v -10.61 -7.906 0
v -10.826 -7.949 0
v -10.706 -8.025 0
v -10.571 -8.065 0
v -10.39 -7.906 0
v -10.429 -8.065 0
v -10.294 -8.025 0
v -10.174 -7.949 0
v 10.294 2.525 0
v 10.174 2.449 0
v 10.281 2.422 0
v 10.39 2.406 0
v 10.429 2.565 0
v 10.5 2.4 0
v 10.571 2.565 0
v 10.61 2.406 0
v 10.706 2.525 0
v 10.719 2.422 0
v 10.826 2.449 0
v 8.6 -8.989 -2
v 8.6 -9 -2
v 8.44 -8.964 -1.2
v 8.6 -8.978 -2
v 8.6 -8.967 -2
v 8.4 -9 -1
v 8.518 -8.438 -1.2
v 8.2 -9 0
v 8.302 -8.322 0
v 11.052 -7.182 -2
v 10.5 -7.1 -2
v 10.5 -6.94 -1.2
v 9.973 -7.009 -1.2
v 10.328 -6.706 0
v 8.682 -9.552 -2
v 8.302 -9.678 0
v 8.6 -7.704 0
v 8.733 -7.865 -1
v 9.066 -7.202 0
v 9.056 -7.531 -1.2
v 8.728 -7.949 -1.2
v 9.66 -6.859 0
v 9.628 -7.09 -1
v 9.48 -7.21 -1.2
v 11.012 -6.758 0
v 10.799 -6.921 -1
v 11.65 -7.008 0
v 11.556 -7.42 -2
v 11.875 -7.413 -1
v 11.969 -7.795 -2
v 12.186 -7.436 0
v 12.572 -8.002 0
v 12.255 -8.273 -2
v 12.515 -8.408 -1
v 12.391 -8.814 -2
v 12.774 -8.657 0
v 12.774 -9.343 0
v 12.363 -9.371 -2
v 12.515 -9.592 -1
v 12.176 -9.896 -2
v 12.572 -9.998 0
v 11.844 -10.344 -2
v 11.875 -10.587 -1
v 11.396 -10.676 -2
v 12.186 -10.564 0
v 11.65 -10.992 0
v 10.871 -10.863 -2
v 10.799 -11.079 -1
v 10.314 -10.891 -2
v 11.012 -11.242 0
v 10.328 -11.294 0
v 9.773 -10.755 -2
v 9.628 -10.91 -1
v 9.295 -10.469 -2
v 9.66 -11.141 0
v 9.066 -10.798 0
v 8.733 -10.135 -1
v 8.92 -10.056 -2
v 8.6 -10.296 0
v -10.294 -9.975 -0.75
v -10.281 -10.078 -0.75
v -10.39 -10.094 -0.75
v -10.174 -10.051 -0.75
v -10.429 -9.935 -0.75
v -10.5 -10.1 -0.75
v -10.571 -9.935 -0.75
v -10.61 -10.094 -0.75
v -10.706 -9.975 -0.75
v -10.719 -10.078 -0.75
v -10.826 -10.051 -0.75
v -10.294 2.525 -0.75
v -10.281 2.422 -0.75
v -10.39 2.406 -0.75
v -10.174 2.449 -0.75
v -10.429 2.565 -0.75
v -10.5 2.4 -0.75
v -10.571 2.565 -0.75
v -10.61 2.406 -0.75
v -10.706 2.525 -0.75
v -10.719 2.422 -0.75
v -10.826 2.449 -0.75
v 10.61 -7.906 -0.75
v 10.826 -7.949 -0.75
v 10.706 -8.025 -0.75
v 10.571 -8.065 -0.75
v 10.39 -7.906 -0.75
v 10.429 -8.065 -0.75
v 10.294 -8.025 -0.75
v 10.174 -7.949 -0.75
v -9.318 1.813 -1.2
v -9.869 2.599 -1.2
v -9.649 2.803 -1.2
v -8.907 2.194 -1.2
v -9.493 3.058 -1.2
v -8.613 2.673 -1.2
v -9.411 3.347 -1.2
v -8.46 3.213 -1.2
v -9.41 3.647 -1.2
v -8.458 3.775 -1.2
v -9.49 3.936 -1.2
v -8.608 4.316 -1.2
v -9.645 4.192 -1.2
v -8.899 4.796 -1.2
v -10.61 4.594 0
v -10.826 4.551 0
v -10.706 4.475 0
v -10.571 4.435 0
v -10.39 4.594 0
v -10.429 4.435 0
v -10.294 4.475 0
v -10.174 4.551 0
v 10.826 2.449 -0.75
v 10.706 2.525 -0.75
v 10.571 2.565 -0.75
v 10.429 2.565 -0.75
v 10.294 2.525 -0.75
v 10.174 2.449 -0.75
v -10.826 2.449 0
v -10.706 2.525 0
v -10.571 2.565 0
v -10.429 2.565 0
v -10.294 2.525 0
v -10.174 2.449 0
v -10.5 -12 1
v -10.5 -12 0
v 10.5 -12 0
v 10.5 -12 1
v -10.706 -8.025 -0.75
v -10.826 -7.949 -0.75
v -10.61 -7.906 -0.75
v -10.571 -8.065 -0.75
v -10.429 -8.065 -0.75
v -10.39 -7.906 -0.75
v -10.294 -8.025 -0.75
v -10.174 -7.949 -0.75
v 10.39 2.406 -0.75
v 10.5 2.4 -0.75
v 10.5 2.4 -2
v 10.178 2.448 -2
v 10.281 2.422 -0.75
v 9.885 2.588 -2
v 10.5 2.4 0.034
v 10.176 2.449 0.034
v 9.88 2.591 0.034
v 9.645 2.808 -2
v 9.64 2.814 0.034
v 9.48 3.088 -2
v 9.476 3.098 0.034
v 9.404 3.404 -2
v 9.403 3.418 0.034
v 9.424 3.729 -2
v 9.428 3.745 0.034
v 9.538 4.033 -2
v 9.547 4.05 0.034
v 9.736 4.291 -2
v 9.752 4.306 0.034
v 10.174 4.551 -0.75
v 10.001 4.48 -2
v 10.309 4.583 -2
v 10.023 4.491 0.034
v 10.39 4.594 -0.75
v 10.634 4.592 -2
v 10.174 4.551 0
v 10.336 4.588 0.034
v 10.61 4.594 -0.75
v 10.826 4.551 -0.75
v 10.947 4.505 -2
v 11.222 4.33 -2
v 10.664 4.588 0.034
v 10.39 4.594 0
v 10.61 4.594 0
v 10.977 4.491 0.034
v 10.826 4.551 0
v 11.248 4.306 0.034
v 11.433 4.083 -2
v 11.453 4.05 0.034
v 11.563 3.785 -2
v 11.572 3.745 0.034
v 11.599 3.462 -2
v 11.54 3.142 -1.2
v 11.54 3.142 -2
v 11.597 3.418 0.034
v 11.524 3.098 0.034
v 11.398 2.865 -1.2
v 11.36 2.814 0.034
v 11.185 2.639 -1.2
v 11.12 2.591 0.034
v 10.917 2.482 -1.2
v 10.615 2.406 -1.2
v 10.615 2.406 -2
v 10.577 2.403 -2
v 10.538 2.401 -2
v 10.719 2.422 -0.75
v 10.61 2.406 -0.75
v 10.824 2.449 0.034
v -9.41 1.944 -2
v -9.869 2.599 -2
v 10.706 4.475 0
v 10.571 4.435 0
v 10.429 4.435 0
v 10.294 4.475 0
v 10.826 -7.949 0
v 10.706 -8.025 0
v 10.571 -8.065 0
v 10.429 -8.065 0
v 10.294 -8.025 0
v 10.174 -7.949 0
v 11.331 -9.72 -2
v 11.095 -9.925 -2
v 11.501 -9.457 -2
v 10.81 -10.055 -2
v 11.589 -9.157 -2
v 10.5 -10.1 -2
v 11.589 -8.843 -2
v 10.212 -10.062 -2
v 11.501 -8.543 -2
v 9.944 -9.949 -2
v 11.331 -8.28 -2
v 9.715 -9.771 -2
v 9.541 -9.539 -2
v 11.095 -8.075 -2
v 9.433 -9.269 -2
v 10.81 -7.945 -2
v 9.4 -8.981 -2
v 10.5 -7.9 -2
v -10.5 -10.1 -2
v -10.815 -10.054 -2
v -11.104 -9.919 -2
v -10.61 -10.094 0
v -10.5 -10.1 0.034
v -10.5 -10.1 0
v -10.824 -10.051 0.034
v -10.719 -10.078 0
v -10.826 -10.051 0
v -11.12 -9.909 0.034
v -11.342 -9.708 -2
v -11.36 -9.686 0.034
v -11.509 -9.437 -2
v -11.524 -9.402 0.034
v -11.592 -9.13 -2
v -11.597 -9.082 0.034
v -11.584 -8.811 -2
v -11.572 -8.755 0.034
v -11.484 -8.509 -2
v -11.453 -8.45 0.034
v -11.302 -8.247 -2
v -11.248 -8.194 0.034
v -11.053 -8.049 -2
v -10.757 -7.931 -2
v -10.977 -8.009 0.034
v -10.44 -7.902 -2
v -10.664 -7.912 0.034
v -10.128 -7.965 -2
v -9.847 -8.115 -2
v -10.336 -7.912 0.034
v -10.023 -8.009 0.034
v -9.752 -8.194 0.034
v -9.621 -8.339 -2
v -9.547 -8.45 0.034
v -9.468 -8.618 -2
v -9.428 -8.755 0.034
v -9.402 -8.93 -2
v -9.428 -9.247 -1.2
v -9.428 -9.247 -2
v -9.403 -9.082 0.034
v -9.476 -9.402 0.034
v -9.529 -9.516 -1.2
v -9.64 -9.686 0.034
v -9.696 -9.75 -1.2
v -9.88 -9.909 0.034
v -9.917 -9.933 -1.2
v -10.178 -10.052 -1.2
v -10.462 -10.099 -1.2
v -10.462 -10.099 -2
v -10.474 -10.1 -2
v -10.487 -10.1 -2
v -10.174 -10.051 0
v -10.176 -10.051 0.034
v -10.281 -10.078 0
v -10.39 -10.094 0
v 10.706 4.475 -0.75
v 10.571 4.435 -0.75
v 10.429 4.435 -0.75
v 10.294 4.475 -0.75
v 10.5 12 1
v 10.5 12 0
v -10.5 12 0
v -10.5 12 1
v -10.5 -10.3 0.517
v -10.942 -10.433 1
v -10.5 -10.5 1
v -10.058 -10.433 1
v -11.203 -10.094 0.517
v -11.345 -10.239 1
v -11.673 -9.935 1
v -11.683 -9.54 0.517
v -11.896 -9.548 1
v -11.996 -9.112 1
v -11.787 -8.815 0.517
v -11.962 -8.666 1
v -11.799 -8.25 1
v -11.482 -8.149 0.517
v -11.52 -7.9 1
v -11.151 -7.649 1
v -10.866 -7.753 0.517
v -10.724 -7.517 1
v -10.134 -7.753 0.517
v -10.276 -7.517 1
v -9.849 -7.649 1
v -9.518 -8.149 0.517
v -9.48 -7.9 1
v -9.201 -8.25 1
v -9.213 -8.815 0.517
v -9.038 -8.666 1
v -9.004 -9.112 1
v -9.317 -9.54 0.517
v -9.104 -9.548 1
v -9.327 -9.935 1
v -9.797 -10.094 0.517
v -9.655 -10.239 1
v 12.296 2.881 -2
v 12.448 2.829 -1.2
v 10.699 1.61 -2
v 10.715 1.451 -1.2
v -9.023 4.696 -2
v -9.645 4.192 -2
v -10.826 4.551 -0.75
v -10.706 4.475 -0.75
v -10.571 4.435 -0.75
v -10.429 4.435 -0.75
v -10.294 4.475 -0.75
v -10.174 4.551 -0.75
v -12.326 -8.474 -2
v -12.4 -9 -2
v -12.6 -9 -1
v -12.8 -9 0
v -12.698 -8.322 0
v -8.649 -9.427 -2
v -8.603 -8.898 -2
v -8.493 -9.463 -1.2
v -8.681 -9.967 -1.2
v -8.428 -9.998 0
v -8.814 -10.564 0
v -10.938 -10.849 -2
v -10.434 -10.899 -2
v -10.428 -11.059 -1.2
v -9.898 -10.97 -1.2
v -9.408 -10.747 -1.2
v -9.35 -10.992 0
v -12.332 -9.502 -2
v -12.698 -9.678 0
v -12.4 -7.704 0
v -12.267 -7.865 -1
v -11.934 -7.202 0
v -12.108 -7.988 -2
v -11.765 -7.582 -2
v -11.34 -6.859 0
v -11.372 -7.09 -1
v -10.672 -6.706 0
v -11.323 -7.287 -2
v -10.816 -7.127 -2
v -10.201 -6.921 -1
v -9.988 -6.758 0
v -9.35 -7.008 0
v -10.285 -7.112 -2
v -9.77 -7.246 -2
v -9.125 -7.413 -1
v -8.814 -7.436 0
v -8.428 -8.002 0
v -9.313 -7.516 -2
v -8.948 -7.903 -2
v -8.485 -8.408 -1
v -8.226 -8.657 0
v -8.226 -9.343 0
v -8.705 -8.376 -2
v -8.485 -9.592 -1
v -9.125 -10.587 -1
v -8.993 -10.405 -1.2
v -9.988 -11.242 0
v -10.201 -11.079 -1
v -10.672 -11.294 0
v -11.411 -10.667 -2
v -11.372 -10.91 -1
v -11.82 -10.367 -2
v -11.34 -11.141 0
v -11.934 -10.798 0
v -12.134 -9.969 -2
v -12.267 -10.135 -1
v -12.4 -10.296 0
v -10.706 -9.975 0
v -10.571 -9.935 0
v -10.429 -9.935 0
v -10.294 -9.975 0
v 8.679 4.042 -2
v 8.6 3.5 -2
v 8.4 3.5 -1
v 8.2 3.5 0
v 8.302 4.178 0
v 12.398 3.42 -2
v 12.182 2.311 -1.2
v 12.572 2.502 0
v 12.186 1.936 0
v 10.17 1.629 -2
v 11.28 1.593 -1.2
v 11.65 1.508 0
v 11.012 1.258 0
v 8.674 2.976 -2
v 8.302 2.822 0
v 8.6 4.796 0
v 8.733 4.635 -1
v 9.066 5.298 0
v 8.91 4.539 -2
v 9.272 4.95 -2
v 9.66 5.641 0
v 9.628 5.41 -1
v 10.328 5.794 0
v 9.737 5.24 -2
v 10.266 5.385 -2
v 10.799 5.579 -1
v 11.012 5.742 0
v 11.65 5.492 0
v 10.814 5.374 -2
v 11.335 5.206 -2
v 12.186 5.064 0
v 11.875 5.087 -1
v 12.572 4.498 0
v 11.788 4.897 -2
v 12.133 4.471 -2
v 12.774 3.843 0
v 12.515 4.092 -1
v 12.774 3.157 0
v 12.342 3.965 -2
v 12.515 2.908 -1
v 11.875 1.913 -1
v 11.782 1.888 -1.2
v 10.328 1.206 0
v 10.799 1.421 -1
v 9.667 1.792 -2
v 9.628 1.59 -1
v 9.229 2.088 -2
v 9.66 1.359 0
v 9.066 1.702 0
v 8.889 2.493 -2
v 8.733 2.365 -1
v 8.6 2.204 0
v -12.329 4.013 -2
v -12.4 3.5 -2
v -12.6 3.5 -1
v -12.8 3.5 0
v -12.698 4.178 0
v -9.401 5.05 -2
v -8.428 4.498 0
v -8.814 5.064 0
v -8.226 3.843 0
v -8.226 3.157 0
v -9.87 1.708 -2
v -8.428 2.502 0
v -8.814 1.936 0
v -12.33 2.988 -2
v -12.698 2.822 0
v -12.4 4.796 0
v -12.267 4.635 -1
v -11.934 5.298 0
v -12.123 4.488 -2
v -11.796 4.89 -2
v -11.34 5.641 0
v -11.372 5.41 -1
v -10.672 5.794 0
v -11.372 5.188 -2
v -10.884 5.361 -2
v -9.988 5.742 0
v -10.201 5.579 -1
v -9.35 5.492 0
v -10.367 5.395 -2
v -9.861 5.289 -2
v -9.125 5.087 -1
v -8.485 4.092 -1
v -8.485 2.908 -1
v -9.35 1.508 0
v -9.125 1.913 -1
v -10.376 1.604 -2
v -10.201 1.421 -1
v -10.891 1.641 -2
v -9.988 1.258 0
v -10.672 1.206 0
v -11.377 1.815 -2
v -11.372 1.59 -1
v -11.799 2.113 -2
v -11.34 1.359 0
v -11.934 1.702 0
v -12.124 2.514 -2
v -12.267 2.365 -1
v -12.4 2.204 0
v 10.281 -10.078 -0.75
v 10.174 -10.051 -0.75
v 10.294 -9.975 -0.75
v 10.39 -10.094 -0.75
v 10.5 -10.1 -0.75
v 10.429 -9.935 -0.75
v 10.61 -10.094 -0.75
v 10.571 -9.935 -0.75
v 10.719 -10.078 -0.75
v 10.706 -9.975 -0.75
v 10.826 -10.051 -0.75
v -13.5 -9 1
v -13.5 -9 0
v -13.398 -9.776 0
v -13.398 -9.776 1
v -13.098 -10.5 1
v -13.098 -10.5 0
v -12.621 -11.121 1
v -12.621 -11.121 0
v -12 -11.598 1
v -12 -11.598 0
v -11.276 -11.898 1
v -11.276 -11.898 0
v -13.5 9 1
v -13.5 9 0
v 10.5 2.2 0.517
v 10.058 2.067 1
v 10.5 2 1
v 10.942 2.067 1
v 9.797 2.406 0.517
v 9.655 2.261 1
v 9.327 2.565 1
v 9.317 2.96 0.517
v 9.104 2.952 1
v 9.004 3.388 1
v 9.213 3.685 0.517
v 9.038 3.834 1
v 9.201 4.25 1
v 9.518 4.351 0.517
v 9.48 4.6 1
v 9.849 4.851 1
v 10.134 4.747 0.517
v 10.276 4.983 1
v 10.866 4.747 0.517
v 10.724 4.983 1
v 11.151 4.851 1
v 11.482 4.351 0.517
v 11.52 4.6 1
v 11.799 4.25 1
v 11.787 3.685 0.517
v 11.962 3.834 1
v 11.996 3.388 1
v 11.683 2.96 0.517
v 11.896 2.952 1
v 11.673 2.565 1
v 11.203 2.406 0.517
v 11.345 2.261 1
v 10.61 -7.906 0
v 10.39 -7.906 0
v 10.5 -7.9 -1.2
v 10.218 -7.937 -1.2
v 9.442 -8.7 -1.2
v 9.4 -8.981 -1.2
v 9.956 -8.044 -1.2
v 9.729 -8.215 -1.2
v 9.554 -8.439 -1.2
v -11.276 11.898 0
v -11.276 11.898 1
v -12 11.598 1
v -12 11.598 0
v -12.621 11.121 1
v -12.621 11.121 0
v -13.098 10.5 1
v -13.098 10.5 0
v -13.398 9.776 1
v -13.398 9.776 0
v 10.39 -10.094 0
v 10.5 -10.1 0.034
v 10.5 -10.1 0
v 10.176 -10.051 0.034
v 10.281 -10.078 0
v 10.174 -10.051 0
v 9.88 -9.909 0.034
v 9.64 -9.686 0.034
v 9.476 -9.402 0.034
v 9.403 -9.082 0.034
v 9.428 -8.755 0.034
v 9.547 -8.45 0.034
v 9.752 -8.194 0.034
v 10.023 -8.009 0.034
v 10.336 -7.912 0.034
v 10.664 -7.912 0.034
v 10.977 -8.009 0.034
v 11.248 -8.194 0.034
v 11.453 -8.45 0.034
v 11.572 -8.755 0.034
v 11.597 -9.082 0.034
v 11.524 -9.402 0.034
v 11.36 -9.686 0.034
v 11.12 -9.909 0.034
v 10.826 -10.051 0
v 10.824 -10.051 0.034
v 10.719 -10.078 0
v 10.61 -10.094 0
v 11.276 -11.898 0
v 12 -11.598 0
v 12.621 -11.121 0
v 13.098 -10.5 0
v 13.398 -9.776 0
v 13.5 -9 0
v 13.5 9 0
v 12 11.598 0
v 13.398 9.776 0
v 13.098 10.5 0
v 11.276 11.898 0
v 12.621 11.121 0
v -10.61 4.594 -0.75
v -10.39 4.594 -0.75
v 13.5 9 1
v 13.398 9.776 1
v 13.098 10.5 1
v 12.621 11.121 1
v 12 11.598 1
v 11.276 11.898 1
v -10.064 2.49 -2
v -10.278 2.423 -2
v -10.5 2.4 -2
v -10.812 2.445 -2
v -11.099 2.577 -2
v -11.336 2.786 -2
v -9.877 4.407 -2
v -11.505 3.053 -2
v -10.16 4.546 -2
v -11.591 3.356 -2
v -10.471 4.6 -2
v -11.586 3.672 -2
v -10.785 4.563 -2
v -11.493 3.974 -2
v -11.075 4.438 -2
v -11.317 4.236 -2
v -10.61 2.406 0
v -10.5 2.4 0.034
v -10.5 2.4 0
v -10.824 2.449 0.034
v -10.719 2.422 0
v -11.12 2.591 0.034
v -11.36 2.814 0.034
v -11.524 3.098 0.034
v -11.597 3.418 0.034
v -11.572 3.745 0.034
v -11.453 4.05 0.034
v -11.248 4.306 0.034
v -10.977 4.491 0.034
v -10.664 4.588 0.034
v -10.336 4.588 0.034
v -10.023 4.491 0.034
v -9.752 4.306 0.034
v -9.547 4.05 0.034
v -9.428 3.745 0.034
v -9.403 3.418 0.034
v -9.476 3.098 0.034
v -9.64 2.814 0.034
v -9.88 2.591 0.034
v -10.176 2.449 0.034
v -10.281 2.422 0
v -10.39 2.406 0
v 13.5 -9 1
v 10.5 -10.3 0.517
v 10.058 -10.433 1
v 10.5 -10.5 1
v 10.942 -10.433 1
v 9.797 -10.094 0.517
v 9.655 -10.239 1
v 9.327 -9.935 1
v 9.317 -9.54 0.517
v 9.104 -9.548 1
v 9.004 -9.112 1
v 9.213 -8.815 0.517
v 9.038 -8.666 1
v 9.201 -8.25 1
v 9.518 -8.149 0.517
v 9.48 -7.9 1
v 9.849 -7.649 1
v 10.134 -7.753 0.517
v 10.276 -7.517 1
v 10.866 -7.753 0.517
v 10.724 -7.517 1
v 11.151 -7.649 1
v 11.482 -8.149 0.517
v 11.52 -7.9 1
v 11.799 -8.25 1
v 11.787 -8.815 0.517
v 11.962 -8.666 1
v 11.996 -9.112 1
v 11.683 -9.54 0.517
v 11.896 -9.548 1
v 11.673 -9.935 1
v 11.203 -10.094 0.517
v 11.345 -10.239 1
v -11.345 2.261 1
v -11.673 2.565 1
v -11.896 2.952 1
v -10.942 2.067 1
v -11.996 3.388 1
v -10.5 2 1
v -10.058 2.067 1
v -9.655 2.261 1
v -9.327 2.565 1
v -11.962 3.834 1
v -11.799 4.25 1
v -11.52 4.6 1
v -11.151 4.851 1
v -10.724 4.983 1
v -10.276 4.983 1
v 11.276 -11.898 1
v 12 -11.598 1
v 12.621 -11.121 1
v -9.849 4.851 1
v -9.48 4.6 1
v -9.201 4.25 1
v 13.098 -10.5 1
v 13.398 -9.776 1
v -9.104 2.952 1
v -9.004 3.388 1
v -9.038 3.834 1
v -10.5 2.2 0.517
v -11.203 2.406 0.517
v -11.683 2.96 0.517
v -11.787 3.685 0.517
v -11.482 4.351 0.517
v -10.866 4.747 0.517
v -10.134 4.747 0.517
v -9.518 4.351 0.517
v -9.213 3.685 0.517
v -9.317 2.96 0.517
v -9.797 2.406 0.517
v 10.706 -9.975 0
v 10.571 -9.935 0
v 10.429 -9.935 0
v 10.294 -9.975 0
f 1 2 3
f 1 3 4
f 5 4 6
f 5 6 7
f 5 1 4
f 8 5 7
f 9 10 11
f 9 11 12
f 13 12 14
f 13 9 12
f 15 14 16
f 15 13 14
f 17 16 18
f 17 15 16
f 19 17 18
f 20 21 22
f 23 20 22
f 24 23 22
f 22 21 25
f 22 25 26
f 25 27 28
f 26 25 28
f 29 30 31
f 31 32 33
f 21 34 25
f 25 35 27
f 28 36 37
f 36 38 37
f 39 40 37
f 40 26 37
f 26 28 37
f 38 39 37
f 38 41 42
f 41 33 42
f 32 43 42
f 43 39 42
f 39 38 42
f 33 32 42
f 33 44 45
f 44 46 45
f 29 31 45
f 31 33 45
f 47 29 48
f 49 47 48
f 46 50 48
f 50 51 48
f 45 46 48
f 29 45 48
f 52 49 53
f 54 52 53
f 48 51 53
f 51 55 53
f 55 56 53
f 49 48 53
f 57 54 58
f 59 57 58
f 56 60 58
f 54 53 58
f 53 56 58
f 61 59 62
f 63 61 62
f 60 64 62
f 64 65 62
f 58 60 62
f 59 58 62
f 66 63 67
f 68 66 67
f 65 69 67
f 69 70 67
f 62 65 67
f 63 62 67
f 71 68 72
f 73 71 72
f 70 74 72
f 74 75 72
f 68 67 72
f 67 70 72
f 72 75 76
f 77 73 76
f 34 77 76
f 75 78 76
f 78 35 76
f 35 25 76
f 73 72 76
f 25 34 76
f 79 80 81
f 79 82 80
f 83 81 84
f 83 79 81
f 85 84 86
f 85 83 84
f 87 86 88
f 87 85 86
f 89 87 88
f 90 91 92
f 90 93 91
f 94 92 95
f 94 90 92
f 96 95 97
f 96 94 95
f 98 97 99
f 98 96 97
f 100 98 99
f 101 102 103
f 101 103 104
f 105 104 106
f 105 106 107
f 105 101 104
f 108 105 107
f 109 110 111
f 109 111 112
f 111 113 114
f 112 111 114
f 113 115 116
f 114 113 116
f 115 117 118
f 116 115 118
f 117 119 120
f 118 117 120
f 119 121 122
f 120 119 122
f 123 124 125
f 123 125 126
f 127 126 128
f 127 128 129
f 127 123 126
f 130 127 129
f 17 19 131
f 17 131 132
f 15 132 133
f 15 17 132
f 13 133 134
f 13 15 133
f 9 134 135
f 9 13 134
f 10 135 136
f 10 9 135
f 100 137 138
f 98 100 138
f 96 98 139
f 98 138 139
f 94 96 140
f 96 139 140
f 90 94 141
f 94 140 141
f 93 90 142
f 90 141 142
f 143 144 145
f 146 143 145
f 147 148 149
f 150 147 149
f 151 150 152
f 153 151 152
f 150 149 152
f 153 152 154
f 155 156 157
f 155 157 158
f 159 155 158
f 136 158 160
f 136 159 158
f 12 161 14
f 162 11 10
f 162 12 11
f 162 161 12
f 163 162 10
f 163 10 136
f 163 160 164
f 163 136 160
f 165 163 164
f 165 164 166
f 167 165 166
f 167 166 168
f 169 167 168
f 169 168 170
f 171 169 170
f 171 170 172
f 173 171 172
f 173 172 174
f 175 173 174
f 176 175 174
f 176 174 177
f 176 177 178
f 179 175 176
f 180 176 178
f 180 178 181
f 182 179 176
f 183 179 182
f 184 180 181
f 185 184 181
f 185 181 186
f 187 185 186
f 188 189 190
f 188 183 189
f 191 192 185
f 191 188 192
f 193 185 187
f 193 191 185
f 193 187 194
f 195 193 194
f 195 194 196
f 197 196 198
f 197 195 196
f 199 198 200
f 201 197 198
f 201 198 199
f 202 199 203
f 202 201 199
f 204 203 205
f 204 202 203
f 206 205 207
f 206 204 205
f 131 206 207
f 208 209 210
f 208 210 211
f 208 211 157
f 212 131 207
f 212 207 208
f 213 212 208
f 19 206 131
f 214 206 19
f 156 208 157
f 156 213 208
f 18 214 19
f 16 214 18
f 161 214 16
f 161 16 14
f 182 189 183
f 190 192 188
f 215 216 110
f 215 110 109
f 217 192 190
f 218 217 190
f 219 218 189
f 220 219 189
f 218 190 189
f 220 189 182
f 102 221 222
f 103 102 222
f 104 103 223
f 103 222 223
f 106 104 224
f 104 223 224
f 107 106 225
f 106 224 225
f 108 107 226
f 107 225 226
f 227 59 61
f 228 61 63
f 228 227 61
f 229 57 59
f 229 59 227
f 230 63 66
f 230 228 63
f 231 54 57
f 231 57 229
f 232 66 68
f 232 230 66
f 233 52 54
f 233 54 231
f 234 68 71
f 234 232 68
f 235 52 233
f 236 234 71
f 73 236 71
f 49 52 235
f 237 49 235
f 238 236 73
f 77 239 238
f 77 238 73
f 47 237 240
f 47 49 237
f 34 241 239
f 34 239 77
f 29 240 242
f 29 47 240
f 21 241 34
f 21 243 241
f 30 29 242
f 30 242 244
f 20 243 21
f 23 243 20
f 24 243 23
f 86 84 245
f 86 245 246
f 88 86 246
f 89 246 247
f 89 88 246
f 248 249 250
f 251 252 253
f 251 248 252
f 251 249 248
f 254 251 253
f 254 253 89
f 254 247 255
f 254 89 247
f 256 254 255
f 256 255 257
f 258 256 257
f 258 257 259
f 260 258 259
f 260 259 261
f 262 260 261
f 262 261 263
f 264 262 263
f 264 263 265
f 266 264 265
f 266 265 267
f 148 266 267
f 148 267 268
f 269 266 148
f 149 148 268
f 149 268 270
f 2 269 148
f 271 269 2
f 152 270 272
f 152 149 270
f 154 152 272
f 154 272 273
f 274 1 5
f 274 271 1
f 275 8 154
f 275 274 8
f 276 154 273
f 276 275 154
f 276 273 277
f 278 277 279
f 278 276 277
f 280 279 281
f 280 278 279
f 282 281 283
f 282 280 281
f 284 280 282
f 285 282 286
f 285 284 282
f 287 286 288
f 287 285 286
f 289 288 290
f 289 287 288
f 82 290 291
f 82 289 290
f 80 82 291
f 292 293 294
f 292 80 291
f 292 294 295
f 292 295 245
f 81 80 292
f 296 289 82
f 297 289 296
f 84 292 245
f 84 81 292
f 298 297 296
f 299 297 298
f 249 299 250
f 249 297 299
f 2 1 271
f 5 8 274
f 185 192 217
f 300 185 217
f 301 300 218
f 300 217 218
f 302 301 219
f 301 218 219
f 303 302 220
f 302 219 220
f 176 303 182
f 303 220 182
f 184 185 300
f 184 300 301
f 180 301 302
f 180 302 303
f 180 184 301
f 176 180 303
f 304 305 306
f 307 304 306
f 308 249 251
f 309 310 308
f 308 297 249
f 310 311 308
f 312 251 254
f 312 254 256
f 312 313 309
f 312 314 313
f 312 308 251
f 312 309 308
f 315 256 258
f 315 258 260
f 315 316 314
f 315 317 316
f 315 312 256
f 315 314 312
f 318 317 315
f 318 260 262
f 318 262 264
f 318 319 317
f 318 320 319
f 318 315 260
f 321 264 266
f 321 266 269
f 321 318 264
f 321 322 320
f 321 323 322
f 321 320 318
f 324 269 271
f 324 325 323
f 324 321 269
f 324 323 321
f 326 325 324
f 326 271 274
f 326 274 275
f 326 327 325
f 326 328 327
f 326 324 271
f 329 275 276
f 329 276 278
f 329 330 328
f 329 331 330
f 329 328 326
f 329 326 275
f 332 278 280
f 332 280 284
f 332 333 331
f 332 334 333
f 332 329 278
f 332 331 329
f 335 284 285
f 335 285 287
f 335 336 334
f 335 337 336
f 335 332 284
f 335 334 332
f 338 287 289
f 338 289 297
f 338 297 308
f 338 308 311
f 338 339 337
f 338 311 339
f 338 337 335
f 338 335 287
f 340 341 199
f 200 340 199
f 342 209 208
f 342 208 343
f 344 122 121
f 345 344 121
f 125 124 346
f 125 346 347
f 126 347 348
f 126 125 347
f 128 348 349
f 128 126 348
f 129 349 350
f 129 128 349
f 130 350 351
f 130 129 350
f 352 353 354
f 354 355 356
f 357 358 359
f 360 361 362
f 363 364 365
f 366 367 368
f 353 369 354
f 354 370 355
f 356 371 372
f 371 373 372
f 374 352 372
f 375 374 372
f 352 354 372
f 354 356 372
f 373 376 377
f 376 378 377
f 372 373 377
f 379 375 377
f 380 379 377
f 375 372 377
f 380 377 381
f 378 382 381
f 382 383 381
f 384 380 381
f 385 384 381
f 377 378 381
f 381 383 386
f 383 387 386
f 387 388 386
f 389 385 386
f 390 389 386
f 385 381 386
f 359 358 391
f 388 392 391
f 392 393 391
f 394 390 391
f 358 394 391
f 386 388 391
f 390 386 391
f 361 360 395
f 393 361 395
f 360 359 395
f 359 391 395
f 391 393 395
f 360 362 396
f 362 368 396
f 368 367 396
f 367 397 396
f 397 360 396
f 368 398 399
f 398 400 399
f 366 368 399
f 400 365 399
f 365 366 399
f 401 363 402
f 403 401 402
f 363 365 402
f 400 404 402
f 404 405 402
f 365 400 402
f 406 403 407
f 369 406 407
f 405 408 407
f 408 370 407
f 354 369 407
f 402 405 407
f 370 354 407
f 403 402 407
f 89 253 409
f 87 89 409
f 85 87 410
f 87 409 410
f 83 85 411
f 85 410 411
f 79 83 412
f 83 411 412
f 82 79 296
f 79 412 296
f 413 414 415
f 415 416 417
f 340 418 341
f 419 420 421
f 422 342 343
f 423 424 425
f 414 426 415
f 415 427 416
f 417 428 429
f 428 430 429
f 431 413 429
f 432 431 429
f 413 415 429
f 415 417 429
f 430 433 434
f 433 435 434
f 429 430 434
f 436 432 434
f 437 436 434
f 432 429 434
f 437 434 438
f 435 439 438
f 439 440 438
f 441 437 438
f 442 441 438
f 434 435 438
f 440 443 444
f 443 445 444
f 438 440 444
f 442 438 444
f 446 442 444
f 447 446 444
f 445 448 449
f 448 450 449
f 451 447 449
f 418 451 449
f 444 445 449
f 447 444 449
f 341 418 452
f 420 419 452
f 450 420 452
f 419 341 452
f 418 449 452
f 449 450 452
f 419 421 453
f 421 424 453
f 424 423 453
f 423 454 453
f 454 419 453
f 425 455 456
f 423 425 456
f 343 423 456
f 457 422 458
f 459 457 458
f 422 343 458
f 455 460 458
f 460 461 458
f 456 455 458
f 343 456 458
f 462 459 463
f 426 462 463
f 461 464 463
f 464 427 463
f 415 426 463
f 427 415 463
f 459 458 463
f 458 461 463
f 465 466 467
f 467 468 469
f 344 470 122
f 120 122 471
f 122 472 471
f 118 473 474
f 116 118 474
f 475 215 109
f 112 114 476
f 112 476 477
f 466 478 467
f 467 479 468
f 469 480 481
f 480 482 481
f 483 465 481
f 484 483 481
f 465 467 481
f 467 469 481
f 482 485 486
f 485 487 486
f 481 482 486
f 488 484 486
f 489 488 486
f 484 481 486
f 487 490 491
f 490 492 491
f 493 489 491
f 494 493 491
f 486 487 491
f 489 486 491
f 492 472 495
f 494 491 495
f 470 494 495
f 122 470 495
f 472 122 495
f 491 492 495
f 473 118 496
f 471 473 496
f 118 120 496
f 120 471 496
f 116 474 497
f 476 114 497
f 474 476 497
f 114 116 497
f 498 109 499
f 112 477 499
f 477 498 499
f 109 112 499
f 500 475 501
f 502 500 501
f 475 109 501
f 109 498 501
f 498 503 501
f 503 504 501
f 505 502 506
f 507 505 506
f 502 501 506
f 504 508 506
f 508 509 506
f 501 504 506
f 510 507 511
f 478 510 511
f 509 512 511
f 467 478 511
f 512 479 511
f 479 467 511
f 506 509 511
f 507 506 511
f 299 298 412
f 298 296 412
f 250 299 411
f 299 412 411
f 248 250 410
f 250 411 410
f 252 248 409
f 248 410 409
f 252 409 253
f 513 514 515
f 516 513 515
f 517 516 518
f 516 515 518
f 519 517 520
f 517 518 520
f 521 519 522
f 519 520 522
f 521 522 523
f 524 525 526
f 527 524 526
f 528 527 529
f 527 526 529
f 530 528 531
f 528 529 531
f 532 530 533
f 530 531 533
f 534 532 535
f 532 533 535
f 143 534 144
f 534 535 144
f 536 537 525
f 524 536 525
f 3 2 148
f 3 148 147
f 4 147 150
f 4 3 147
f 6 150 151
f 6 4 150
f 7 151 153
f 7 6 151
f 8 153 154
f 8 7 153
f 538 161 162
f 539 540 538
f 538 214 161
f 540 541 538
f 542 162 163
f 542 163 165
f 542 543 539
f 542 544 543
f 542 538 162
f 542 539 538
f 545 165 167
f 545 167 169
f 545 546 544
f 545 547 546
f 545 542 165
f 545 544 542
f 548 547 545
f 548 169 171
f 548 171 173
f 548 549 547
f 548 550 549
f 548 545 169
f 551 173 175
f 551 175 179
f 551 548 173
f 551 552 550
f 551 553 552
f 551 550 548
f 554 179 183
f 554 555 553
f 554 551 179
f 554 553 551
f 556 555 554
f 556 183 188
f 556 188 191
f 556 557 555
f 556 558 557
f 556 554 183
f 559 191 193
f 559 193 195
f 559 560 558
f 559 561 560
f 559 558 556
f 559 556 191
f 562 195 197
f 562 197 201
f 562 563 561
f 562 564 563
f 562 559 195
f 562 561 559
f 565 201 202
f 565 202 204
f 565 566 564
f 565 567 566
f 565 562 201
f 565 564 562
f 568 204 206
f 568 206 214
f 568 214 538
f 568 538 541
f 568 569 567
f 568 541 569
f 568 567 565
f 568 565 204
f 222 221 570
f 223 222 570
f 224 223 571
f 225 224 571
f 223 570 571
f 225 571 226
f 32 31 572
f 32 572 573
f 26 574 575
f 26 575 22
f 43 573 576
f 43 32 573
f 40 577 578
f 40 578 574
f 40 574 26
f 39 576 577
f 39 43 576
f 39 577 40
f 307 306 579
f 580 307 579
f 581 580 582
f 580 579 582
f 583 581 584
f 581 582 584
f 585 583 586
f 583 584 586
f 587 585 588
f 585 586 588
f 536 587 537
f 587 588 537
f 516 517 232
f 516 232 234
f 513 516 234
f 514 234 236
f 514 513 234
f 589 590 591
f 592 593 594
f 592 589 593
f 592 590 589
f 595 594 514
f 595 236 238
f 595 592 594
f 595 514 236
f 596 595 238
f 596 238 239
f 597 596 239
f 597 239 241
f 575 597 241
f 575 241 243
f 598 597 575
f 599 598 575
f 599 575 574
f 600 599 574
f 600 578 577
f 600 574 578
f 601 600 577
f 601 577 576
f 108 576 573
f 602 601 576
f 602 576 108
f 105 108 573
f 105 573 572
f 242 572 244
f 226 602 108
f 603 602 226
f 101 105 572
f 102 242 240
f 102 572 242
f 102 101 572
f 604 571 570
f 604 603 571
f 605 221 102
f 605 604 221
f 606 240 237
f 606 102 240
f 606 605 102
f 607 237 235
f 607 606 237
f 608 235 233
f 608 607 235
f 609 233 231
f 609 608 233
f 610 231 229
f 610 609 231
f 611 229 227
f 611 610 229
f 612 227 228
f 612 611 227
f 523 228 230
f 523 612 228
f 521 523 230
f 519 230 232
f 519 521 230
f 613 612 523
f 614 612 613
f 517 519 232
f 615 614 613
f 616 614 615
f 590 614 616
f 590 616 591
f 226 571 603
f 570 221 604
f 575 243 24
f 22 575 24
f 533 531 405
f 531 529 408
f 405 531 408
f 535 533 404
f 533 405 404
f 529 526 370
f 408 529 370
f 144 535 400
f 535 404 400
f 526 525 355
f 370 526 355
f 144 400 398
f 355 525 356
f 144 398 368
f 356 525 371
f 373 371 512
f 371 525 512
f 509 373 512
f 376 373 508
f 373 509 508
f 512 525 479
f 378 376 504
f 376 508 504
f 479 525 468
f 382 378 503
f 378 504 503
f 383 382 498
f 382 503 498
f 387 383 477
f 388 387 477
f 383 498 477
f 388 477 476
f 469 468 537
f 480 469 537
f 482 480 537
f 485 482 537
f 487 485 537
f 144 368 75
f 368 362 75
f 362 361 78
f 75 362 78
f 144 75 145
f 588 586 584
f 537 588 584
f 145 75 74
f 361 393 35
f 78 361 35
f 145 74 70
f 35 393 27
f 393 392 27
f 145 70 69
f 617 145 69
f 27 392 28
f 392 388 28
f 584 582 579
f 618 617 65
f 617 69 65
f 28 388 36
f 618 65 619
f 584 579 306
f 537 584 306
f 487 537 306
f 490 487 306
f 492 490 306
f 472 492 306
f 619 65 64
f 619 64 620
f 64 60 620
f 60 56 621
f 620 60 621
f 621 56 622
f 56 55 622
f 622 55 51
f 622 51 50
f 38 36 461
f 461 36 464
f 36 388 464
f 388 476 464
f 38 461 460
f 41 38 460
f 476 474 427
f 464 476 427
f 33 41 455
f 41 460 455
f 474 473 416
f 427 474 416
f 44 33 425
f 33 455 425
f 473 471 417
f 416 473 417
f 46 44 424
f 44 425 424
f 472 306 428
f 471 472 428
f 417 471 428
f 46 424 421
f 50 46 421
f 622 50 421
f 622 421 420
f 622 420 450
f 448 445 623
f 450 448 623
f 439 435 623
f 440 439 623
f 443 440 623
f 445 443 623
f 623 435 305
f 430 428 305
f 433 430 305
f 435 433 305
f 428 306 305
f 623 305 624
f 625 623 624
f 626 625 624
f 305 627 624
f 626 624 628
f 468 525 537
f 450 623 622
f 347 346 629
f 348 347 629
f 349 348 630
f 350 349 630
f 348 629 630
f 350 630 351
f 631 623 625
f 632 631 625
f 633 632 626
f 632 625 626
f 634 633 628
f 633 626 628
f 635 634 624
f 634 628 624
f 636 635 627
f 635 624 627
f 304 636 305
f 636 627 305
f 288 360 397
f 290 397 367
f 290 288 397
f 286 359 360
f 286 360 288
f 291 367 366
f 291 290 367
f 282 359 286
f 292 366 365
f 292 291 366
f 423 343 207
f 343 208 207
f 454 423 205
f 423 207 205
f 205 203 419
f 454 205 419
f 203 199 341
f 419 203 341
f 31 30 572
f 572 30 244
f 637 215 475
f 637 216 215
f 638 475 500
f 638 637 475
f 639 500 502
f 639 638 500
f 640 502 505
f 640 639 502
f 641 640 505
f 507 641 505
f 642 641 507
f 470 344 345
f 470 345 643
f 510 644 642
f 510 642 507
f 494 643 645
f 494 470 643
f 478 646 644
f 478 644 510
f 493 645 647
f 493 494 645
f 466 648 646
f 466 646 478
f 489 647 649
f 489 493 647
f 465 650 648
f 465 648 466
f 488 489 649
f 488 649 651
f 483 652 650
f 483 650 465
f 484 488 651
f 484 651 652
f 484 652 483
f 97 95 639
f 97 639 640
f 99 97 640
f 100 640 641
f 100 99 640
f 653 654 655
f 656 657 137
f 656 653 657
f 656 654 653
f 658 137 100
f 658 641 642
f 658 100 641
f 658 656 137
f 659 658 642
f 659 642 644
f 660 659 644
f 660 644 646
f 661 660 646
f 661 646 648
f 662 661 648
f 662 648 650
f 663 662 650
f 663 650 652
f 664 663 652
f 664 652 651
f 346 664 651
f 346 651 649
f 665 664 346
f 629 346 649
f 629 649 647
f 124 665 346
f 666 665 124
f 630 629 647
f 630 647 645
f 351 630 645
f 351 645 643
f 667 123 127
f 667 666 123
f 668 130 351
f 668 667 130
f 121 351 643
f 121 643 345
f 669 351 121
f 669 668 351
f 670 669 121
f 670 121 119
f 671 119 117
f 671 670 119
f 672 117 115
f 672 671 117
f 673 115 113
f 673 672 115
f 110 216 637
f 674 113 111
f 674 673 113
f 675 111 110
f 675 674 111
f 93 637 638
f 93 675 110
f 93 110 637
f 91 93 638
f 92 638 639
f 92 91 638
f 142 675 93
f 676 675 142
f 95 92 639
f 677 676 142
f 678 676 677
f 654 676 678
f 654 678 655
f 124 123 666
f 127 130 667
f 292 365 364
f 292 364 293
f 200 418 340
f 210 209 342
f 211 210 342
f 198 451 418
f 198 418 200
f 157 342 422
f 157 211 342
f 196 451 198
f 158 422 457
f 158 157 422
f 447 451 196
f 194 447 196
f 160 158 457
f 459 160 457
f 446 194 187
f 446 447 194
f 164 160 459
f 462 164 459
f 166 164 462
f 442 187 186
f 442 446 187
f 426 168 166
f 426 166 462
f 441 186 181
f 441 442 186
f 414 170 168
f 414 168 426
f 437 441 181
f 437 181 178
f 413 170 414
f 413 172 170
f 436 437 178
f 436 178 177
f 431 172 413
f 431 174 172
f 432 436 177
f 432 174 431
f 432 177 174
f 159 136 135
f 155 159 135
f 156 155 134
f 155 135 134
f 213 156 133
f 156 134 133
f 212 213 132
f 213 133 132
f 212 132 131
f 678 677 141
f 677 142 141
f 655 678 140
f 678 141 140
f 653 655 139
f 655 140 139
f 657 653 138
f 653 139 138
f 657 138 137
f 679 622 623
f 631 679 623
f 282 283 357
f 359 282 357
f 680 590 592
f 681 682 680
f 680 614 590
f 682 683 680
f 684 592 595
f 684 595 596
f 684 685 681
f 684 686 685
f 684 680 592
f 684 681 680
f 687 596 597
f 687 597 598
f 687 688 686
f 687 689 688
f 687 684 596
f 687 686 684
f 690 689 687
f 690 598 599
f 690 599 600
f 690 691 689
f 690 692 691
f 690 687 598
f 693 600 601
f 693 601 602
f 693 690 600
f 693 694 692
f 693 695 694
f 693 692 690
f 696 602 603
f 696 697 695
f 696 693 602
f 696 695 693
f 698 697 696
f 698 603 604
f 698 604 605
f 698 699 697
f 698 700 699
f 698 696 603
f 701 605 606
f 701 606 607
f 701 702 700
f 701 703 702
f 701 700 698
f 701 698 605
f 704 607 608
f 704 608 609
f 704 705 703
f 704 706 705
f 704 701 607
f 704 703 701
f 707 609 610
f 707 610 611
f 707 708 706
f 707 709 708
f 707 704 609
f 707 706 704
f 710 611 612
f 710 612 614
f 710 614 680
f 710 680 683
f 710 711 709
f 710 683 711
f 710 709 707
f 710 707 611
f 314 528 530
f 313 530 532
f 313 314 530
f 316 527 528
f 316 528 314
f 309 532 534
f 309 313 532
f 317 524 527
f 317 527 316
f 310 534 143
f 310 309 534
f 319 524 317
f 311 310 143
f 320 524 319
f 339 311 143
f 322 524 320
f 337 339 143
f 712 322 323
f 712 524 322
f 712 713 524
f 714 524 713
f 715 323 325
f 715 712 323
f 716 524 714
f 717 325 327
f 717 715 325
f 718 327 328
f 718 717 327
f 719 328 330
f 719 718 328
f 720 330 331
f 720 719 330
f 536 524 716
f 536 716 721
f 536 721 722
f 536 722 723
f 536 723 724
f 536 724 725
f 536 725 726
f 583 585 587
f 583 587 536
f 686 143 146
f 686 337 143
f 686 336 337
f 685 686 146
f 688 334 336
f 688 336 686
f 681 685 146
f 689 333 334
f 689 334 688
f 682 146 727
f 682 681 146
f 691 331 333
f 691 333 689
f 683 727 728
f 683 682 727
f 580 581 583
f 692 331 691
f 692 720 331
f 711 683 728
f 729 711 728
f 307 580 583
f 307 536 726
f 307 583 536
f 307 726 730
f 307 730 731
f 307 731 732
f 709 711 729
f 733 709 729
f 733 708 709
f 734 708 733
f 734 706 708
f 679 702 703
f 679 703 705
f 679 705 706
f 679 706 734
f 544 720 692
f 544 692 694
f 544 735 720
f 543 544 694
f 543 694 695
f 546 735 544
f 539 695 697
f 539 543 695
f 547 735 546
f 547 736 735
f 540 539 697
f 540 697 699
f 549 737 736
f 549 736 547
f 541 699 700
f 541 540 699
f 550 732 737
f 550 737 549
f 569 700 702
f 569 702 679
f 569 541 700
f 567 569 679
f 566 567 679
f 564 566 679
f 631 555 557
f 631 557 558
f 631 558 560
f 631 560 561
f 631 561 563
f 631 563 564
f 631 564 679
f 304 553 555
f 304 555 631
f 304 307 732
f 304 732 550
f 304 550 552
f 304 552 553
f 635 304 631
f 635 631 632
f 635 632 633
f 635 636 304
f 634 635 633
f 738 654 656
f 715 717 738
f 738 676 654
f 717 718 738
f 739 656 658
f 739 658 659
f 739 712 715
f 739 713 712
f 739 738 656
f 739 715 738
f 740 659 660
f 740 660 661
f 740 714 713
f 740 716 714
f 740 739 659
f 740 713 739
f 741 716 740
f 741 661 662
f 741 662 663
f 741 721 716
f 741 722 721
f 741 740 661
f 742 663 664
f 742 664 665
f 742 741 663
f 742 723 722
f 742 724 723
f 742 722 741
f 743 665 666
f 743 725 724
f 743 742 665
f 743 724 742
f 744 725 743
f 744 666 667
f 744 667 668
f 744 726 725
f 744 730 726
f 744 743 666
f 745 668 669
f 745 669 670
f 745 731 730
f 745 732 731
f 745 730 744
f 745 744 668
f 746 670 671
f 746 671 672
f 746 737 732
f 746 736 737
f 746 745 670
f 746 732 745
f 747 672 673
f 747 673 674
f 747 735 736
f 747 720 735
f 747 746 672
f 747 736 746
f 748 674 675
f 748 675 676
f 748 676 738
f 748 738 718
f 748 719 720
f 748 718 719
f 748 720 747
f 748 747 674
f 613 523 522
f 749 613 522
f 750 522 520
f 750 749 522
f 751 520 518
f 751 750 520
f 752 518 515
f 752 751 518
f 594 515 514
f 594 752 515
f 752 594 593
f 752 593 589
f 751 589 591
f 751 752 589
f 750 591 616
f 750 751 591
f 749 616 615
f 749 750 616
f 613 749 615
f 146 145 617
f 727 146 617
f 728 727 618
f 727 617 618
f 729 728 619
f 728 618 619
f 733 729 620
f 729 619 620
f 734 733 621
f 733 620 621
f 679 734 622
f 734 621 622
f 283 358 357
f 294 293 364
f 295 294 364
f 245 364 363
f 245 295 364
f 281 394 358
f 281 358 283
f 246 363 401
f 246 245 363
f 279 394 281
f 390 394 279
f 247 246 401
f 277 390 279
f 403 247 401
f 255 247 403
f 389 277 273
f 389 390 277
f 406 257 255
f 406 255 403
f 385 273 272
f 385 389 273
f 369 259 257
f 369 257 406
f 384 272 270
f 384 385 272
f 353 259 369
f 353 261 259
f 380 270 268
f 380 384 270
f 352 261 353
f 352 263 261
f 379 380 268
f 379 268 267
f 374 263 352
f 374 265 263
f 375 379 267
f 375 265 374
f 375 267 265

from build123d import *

# Parameters (mm, degrees)
BOSS_EXTRUDE1_DEPTH           = 1
SKETCH4_R                     = 2.3
BOSS_EXTRUDE2_DEPTH           = 2
M2_CLEARANCE_HOLE1_AT_2_COUNT = 2
M2_CLEARANCE_HOLE1_AT_2_PITCH = 12.5
M2_CLEARANCE_HOLE1_AT_3_COUNT = 2
M2_CLEARANCE_HOLE1_AT_3_PITCH = 24.43869882
M2_CLEARANCE_HOLE1_AT_4_COUNT = 2
M2_CLEARANCE_HOLE1_AT_4_PITCH = 21
BOSS_EXTRUDE3_START           = -1
BOSS_EXTRUDE3_DEPTH           = 0.75
CHAMFER1_SIZE                 = 0.4
CHAMFER1_SIZE_2               = 2
CUT_EXTRUDE2_DEPTH            = 0.8


with BuildPart() as part:
    # Sketch1 → Boss-Extrude1 (new body)
    with BuildSketch(Plane.XY):
        with BuildLine():
            Line((10.5, 12), (-10.5, 12))
            ThreePointArc((-10.5, 12), (-12.621320344, 11.121320344), (-13.5, 9))
            Line((-13.5, 9), (-13.5, -9))
            ThreePointArc((-13.5, -9), (-12.621320344, -11.121320344), (-10.5, -12))
            Line((-10.5, -12), (10.5, -12))
            ThreePointArc((10.5, -12), (12.621320344, -11.121320344), (13.5, -9))
            Line((13.5, -9), (13.5, 9))
            ThreePointArc((13.5, 9), (12.621320344, 11.121320344), (10.5, 12))
        make_face()
    extrude(amount=BOSS_EXTRUDE1_DEPTH)

    # Sketch4 → Boss-Extrude2 (add)
    with BuildSketch(Plane(origin=(0, 0, 0), x_dir=(-1, 0, 0), z_dir=(0, 0, -1))):
        with Locations((-10.5, 3.5)):
            Circle(SKETCH4_R)
        with Locations((10.5, 3.5)):
            Circle(SKETCH4_R)
        with Locations((10.5, -9)):
            Circle(SKETCH4_R)
        with Locations((-10.5, -9)):
            Circle(SKETCH4_R)
    extrude(amount=BOSS_EXTRUDE2_DEPTH)

    # Sketch3 → M2 Clearance Hole1 (revolve, cut)
    with BuildSketch(Plane(origin=(10.5, 3.5, 1), x_dir=(0, -1, 0), z_dir=(1, 0, 0))):
        Polygon((0, 0), (0, 3), (1.1, 3), (1.1, 0.965685425), (1.5, 0), align=None)
    m2_clearance_hole1 = revolve(axis=Axis((10.5, 3.5, 7.35), (0, 0, -1)), mode=Mode.SUBTRACT)

    # M2 Clearance Hole1 at 2: M2 Clearance Hole1 ×2
    with Locations(*[(0, -i * M2_CLEARANCE_HOLE1_AT_2_PITCH, 0) for i in range(1, M2_CLEARANCE_HOLE1_AT_2_COUNT)]):
        add(m2_clearance_hole1, mode=Mode.SUBTRACT)

    # M2 Clearance Hole1 at 3: M2 Clearance Hole1 ×2
    with Locations(*[Vector(-0.8592928844097065, -0.5114838597676831, 0) * (i * M2_CLEARANCE_HOLE1_AT_3_PITCH) for i in range(1, M2_CLEARANCE_HOLE1_AT_3_COUNT)]):
        add(m2_clearance_hole1, mode=Mode.SUBTRACT)

    # M2 Clearance Hole1 at 4: M2 Clearance Hole1 ×2
    with Locations(*[(-i * M2_CLEARANCE_HOLE1_AT_4_PITCH, 0, 0) for i in range(1, M2_CLEARANCE_HOLE1_AT_4_COUNT)]):
        add(m2_clearance_hole1, mode=Mode.SUBTRACT)

    # Sketch6 → Boss-Extrude3 (add)
    with BuildSketch(Plane.XY.offset(1).offset(BOSS_EXTRUDE3_START)):
        with BuildLine():
            Line((10.124367201, 2.4), (10.875632799, 2.4))
            ThreePointArc((10.875632799, 2.4), (10.5, 2.57), (10.124367201, 2.4))
        make_face()
        with BuildLine():
            Line((10.124367201, 4.6), (10.875632799, 4.6))
            ThreePointArc((10.875632799, 4.6), (10.5, 4.43), (10.124367201, 4.6))
        make_face()
        with BuildLine():
            Line((-10.124367201, 2.4), (-10.875632799, 2.4))
            ThreePointArc((-10.875632799, 2.4), (-10.5, 2.57), (-10.124367201, 2.4))
        make_face()
        with BuildLine():
            Line((-10.124367201, 4.6), (-10.875632799, 4.6))
            ThreePointArc((-10.875632799, 4.6), (-10.5, 4.43), (-10.124367201, 4.6))
        make_face()
        with BuildLine():
            Line((10.124367201, -10.1), (10.875632799, -10.1))
            ThreePointArc((10.875632799, -10.1), (10.5, -9.93), (10.124367201, -10.1))
        make_face()
        with BuildLine():
            Line((10.124367201, -7.9), (10.875632799, -7.9))
            ThreePointArc((10.875632799, -7.9), (10.5, -8.07), (10.124367201, -7.9))
        make_face()
        with BuildLine():
            Line((-10.124367201, -10.1), (-10.875632799, -10.1))
            ThreePointArc((-10.875632799, -10.1), (-10.5, -9.93), (-10.124367201, -10.1))
        make_face()
        with BuildLine():
            Line((-10.124367201, -7.9), (-10.875632799, -7.9))
            ThreePointArc((-10.875632799, -7.9), (-10.5, -8.07), (-10.124367201, -7.9))
        make_face()
    extrude(amount=-BOSS_EXTRUDE3_DEPTH)

    # Chamfer1
    # the kernel refuses this chamfer: 2, 0.4 mm, written as the material it takes off along each edge
    with BuildSketch(Plane(origin=(10.5, 3.5, -2), x_dir=(-1, 0, 0), z_dir=(0, -1, 0))) as chamfer1_piece_1_section:
        Polygon((2.3 - CHAMFER1_SIZE, 0), (2.3, -CHAMFER1_SIZE_2), (2.3, 0), align=None)
    chamfer1_piece_1 = revolve(axis=Axis((10.5, 3.5, -2), (0, 0, -1)), mode=Mode.PRIVATE)
    chamfer1_piece_1 = split(chamfer1_piece_1, bisect_by=Plane(origin=(12.610878193, 3.5, 0), z_dir=(0, 0, -1)), keep=Keep.TOP, mode=Mode.PRIVATE)
    add(chamfer1_piece_1, mode=Mode.SUBTRACT)
    with BuildSketch(Plane(origin=(-10.5, 3.5, -2), x_dir=(-1, 0, 0), z_dir=(0, -1, 0))) as chamfer1_piece_2_section:
        Polygon((2.3 - CHAMFER1_SIZE, 0), (2.3, -CHAMFER1_SIZE_2), (2.3, 0), align=None)
    chamfer1_piece_2 = revolve(axis=Axis((-10.5, 3.5, -2), (0, 0, -1)), mode=Mode.PRIVATE)
    chamfer1_piece_2 = split(chamfer1_piece_2, bisect_by=Plane(origin=(-8.389121807, 3.5, 0), z_dir=(0, 0, -1)), keep=Keep.TOP, mode=Mode.PRIVATE)
    add(chamfer1_piece_2, mode=Mode.SUBTRACT)
    with BuildSketch(Plane(origin=(-10.5, -9, -2), x_dir=(-1, 0, 0), z_dir=(0, -1, 0))) as chamfer1_piece_3_section:
        Polygon((2.3 - CHAMFER1_SIZE, 0), (2.3, -CHAMFER1_SIZE_2), (2.3, 0), align=None)
    chamfer1_piece_3 = revolve(axis=Axis((-10.5, -9, -2), (0, 0, -1)), mode=Mode.PRIVATE)
    chamfer1_piece_3 = split(chamfer1_piece_3, bisect_by=Plane(origin=(-8.389121807, -9, 0), z_dir=(0, 0, -1)), keep=Keep.TOP, mode=Mode.PRIVATE)
    add(chamfer1_piece_3, mode=Mode.SUBTRACT)
    with BuildSketch(Plane(origin=(10.5, -9, -2), x_dir=(-1, 0, 0), z_dir=(0, -1, 0))) as chamfer1_piece_4_section:
        Polygon((2.3 - CHAMFER1_SIZE, 0), (2.3, -CHAMFER1_SIZE_2), (2.3, 0), align=None)
    chamfer1_piece_4 = revolve(axis=Axis((10.5, -9, -2), (0, 0, -1)), mode=Mode.PRIVATE)
    chamfer1_piece_4 = split(chamfer1_piece_4, bisect_by=Plane(origin=(12.610878193, -9, 0), z_dir=(0, 0, -1)), keep=Keep.TOP, mode=Mode.PRIVATE)
    add(chamfer1_piece_4, mode=Mode.SUBTRACT)

    # Sketch5 → Cut-Extrude2 (cut)
    with BuildSketch(Plane(origin=(0, 0, -2), x_dir=(-1, 0, 0), z_dir=(0, 0, -1))):
        with BuildLine():
            Line((8.712564289, 4.947436899), (10.5, 3.5))
            Line((10.5, 3.5), (9.180774196, 1.615950298))
            ThreePointArc((9.180774196, 1.615950298), (8.222383442, 3.179901868), (8.712564289, 4.947436899))
        make_face()
        with BuildLine():
            Line((10.419731158, -11.298598902), (10.5, -9))
            Line((10.5, -9), (8.258948851, -9.517387425))
            ThreePointArc((8.258948851, -9.517387425), (9.037020093, -10.774736542), (10.419731158, -11.298598902))
        make_face()
        with BuildLine():
            Line((-12.674692724, 2.751193245), (-10.5, 3.5))
            Line((-10.5, 3.5), (-10.740415466, 1.212599641))
            ThreePointArc((-10.740415466, 1.212599641), (-11.931783664, 1.700001239), (-12.674692724, 2.751193245))
        make_face()
        with BuildLine():
            Line((-10.5, -6.7), (-10.5, -9))
            Line((-10.5, -9), (-8.200350301, -8.959859465))
            ThreePointArc((-8.200350301, -8.959859465), (-8.887908692, -7.359523967), (-10.5, -6.7))
        make_face()
    extrude(amount=-CUT_EXTRUDE2_DEPTH, mode=Mode.SUBTRACT)


solid = part.part
